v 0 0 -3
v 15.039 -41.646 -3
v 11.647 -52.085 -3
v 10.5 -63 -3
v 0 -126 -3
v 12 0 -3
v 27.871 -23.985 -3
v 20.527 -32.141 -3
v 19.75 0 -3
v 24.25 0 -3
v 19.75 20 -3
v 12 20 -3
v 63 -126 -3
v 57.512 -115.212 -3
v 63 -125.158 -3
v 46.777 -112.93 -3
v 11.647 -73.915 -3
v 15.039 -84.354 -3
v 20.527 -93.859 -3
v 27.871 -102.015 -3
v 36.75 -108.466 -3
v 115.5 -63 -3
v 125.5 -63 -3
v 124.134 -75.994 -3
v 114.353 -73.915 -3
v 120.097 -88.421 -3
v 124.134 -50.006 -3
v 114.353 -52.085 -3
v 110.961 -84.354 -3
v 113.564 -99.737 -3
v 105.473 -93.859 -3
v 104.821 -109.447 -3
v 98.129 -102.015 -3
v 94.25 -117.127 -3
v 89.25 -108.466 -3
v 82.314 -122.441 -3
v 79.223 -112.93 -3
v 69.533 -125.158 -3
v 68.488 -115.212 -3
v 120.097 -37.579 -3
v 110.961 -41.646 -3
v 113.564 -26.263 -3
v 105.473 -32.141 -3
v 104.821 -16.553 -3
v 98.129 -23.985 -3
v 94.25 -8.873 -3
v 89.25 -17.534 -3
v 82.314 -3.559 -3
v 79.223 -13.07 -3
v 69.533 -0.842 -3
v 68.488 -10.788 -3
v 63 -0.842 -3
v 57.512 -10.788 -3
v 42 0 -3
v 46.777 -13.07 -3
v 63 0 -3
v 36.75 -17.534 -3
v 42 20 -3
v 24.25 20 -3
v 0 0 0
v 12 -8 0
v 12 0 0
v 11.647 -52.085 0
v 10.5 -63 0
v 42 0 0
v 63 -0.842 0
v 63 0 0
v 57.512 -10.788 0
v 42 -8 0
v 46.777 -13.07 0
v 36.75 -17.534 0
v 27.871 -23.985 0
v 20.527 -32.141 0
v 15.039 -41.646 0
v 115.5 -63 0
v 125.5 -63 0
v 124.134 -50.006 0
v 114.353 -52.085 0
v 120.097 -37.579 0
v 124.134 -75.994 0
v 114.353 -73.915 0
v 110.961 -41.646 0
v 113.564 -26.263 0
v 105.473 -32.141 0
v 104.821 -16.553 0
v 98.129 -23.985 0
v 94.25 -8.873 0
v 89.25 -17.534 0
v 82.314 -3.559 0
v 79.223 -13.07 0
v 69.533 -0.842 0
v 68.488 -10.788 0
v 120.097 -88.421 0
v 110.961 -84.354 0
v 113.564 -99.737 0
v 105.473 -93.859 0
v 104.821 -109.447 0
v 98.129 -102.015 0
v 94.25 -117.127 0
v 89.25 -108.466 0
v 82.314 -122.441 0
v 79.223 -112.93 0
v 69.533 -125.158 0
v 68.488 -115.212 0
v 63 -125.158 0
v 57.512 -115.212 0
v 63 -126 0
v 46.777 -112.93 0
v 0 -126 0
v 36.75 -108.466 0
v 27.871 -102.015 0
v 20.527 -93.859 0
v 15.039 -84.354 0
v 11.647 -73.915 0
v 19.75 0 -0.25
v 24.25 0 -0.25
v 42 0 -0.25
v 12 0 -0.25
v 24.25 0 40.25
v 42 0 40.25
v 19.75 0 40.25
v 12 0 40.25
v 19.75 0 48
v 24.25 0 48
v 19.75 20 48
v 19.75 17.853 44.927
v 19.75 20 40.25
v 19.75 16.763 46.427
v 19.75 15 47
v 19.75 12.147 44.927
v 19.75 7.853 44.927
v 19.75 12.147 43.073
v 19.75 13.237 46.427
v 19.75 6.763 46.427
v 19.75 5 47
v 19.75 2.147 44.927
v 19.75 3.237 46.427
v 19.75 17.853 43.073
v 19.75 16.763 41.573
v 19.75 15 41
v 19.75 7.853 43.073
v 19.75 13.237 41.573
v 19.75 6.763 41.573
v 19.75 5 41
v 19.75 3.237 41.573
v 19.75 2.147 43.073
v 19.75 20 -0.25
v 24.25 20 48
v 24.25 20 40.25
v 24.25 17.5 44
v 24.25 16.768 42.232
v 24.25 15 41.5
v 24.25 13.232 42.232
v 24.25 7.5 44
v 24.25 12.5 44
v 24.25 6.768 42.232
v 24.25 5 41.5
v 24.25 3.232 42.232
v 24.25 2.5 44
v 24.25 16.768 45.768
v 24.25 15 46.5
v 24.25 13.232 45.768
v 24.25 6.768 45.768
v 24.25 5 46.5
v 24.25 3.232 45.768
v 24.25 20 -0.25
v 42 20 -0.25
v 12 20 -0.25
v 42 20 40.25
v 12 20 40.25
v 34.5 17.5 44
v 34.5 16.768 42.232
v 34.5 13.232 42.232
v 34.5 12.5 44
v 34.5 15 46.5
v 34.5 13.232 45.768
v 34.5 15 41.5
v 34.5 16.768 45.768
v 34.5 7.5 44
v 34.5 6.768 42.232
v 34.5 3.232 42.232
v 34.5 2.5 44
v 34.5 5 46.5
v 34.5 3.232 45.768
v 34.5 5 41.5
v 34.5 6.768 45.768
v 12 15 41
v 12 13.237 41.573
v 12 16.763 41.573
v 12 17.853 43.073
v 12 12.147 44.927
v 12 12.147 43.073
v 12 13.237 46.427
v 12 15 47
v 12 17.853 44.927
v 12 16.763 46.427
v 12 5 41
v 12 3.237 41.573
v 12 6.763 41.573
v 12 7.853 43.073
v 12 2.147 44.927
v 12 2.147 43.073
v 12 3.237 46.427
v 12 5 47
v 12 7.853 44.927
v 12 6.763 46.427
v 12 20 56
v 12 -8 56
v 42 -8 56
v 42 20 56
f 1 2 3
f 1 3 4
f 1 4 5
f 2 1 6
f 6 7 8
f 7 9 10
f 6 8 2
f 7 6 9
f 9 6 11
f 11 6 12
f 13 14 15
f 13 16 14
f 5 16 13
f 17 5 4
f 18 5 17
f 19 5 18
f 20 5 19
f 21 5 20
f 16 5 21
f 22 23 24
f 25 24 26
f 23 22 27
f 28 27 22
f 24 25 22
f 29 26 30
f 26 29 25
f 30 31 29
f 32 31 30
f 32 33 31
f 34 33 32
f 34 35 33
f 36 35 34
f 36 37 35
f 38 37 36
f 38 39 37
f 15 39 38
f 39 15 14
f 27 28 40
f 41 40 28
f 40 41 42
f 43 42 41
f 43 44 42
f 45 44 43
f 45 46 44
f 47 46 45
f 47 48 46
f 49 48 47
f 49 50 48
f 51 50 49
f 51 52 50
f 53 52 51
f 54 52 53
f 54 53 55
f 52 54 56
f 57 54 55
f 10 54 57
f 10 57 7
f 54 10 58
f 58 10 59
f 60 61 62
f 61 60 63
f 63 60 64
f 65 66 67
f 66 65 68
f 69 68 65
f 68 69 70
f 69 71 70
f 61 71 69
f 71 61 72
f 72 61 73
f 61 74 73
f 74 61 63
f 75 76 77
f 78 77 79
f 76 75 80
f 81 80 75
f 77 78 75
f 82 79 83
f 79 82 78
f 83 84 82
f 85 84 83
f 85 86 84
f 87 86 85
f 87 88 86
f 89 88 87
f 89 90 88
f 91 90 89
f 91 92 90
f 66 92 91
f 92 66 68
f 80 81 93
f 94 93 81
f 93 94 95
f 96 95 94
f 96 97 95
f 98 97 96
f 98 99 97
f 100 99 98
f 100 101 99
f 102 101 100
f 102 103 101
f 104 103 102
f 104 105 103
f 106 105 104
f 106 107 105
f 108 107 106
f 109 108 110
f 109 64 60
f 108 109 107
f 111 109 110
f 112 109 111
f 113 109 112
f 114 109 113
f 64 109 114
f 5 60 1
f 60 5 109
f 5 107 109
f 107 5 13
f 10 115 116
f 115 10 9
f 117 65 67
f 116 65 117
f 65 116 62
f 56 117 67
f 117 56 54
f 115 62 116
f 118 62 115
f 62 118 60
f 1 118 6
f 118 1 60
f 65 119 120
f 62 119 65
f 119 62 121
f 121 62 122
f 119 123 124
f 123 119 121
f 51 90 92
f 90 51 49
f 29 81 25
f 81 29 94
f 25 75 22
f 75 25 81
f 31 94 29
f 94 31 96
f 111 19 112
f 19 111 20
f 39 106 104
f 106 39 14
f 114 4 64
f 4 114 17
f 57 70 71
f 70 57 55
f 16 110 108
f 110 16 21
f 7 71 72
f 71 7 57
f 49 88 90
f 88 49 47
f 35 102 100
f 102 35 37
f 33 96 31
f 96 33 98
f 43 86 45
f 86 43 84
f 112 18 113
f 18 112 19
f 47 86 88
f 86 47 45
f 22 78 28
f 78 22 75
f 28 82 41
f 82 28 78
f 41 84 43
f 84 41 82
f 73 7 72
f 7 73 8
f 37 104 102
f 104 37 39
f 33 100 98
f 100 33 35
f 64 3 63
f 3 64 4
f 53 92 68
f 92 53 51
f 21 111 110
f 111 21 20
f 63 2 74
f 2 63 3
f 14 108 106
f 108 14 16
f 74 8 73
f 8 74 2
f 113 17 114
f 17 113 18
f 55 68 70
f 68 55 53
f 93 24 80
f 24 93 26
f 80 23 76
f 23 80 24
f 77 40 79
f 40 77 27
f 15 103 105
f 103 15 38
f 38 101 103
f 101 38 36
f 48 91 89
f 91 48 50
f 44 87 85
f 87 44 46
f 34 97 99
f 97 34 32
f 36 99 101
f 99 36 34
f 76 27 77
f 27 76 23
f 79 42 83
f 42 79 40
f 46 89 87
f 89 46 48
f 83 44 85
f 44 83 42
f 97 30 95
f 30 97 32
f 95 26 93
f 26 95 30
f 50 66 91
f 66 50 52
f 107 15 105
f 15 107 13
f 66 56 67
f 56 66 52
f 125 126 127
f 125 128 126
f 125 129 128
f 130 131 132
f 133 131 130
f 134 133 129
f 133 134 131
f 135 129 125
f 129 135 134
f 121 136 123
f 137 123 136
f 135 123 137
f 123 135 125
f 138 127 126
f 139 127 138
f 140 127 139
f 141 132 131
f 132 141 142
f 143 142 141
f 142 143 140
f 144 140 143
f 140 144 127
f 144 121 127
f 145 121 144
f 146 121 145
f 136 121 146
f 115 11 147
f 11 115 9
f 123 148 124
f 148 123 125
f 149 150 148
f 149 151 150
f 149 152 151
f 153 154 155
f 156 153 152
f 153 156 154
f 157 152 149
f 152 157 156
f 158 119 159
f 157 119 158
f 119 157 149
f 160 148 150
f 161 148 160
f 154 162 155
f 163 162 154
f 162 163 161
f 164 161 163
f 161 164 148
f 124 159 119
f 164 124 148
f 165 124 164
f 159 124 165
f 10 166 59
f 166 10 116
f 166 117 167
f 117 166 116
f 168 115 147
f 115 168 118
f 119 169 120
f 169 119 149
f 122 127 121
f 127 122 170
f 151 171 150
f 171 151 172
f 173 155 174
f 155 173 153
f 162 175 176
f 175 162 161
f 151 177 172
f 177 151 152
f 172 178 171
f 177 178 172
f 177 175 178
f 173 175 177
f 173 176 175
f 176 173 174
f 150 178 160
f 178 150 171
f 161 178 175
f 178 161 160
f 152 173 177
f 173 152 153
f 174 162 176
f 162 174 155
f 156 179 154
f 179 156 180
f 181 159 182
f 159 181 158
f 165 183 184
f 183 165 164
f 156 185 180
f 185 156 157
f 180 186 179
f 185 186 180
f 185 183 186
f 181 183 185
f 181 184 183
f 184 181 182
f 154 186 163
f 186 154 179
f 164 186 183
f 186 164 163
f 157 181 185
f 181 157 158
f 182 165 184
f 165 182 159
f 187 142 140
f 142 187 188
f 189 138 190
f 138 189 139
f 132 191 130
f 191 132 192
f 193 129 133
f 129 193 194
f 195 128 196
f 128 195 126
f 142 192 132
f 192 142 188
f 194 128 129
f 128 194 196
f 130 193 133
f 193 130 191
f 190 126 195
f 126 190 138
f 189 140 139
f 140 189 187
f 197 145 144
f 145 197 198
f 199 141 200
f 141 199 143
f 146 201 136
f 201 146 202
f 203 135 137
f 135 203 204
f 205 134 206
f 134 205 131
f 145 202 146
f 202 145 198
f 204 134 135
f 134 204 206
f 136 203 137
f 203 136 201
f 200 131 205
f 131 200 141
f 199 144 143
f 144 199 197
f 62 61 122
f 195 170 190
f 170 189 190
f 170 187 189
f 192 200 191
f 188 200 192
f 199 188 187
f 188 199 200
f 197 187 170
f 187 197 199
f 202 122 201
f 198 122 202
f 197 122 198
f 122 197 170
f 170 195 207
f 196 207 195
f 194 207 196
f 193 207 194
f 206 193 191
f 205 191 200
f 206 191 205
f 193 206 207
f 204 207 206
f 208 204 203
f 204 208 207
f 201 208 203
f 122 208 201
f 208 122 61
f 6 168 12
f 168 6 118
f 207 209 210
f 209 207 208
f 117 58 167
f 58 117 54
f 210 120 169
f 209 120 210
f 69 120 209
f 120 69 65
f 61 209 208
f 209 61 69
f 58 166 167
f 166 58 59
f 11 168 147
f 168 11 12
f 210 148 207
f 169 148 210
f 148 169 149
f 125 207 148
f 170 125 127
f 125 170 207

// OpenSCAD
rail_length=220;
rail_thick=3;
rail_depth=15;

carriage_thick=3;
carriage_bowl=105;
carriage_length=carriage_bowl+rail_depth*0.7*2;
carriage_side=(carriage_length-carriage_bowl)/2;
screw_thick=3;
screw_cap=4;

// General Variables
pi = 3.14159;
rad = 57.29578;
clearance = 0.05;   // clearance between teeth

/*  Converts Radians to Degrees */
function grad(pressure_angle) = pressure_angle*rad;

/*  Converts Degrees to Radians */
function radian(pressure_angle) = pressure_angle/rad;


/*  Copy and rotate a Body */
module copier(vect, number, distance, winkel){
    for(i = [0:number-1]){
        translate(v=vect*distance*i)
            rotate(a=i*winkel, v = [0,0,1])
                children(0);
    }
}
/*  Circle Involutes-Function:
    Returns the Polar Coordinates of an Involute Circle
    r = Radius of the Base Circle
    rho = Rolling-angle in Degrees */
function ev(r,rho) = [
    r/cos(rho),
    grad(tan(rho)-radian(rho))
];
/*  Converts 2D Polar Coordinates to Cartesian
    Format: radius, phi; phi = Angle to x-Axis on xy-Plane */
function polar_to_cartesian(polvect) = [
    polvect[0]*cos(polvect[1]),  
    polvect[0]*sin(polvect[1])
];
/*  Spur gear
    modul = Height of the Tooth Tip beyond the Pitch Circle
    tooth_number = Number of Gear Teeth
    width = tooth_width
    bore = Diameter of the Center Hole
    pressure_angle = Pressure Angle, Standard = 20° according to DIN 867. Should not exceed 45°.
    helix_angle = Helix Angle to the Axis of Rotation; 0° = Spur Teeth
    optimized = Create holes for Material-/Weight-Saving or Surface Enhancements where Geometry allows */
module spur_gear(modul, tooth_number, width, bore, pressure_angle = 20, helix_angle = 0, optimized = true) {

    // Dimension Calculations  
    d = modul * tooth_number;                                           // Pitch Circle Diameter
    r = d / 2;                                                      // Pitch Circle Radius
    alpha_spur = atan(tan(pressure_angle)/cos(helix_angle));// Helix Angle in Transverse Section
    db = d * cos(alpha_spur);                                      // Base Circle Diameter
    rb = db / 2;                                                    // Base Circle Radius
    da = (modul <1)? d + modul * 2.2 : d + modul * 2;               // Tip Diameter according to DIN 58400 or DIN 867
    ra = da / 2;                                                    // Tip Circle Radius
    c =  (tooth_number <3)? 0 : modul/6;                                // Tip Clearance
    df = d - 2 * (modul + c);                                       // Root Circle Diameter
    rf = df / 2;                                                    // Root Radius
    rho_ra = acos(rb/ra);                                           // Maximum Rolling Angle;
                                                                    // Involute begins on the Base Circle and ends at the Tip Circle
    rho_r = acos(rb/r);                                             // Rolling Angle at Pitch Circle;
                                                                    // Involute begins on the Base Circle and ends at the Tip Circle
    phi_r = grad(tan(rho_r)-radian(rho_r));                         // Angle to Point of Involute on Pitch Circle
    gamma = rad*width/(r*tan(90-helix_angle));               // Torsion Angle for Extrusion
    step = rho_ra/16;                                            // Involute is divided into 16 pieces
    tau = 360/tooth_number;                                             // Pitch Angle
    
    r_hole = (2*rf - bore)/8;                                    // Radius of Holes for Material-/Weight-Saving
    rm = bore/2+2*r_hole;                                        // Distance of the Axes of the Holes from the Main Axis
    z_hole = floor(2*pi*rm/(3*r_hole));                             // Number of Holes for Material-/Weight-Saving
    
    optimized = (optimized && r >= width*1.5 && d > 2*bore);    // is Optimization useful?

    // Drawing
    union(){
        rotate([0,0,-phi_r-90*(1-clearance)/tooth_number]){                     // Center Tooth on X-Axis;
                                                                        // Makes Alignment with other Gears easier

            linear_extrude(height = width, twist = gamma){
                difference(){
                    union(){
                        tooth_width = (180*(1-clearance))/tooth_number+2*phi_r;
                        circle(rf);                                     // Root Circle 
                        for (rot = [0:tau:360]){
                            rotate (rot){                               // Copy and Rotate "Number of Teeth"
                                polygon(concat(                         // Tooth
                                    [[0,0]],                            // Tooth Segment starts and ends at Origin
                                    [for (rho = [0:step:rho_ra])     // From zero Degrees (Base Circle)
                                                                        // To Maximum Involute Angle (Tip Circle)
                                        polar_to_cartesian(ev(rb,rho))],       // First Involute Flank

                                    [polar_to_cartesian(ev(rb,rho_ra))],       // Point of Involute on Tip Circle

                                    [for (rho = [rho_ra:-step:0])    // of Maximum Involute Angle (Tip Circle)
                                                                        // to zero Degrees (Base Circle)
                                        polar_to_cartesian([ev(rb,rho)[0], tooth_width-ev(rb,rho)[1]])]
                                                                        // Second Involute Flank
                                                                        // (180*(1-clearance)) instead of 180 Degrees,
                                                                        // to allow clearance of the Flanks
                                    )
                                );
                            }
                        }
                    }           
                    circle(r = rm+r_hole*1.49);                         // "bore"
                }
            }
        }
        // with Material Savings
        if (optimized) {
            linear_extrude(height = width){
                difference(){
                        circle(r = (bore+r_hole)/2);
                        circle(r = bore/2);                          // bore
                    }
                }
            linear_extrude(height = (width-r_hole/2 < width*2/3) ? width*2/3 : width-r_hole/2){
                difference(){
                    circle(r=rm+r_hole*1.51);
                    union(){
                        circle(r=(bore+r_hole)/2);
                        for (i = [0:1:z_hole]){
                            translate(sphere_to_cartesian([rm,90,i*360/z_hole]))
                                circle(r = r_hole);
                        }
                    }
                }
            }
        }
        // without Material Savings
        else {
            linear_extrude(height = width){
                difference(){
                    circle(r = rm+r_hole*1.51);
                    circle(r = bore/2);
                }
            }
        }
    }
}
/*  Herringbone; uses the module "spur_gear"
    modul = Height of the Tooth Tip beyond the Pitch Circle
    tooth_number = Number of Gear Teeth
    width = tooth_width
    bore = Diameter of the Center Hole
    pressure_angle = Pressure Angle, Standard = 20° according to DIN 867. Should not exceed 45°.
    helix_angle = Helix Angle to the Axis of Rotation, Standard = 0° (Spur Teeth)
    optimized = Holes for Material-/Weight-Saving */
module herringbone_gear(modul, tooth_number, width, bore, pressure_angle = 20, helix_angle=0, optimized=true){

    width = width/2;
    d = modul * tooth_number;                                           // Pitch Circle Diameter
    r = d / 2;                                                      // Pitch Circle Radius
    c =  (tooth_number <3)? 0 : modul/6;                                // Tip Clearance

    df = d - 2 * (modul + c);                                       // Root Circle Diameter
    rf = df / 2;                                                    // Root Radius

    r_hole = (2*rf - bore)/8;                                    // Radius of Holes for Material-/Weight-Saving
    rm = bore/2+2*r_hole;                                        // Distance of the Axes of the Holes from the Main Axis
    z_hole = floor(2*pi*rm/(3*r_hole));                             // Number of Holes for Material-/Weight-Saving
    
    optimized = (optimized && r >= width*3 && d > 2*bore);      // is Optimization useful?

    translate([0,0,width]){
        union(){
            spur_gear(modul, tooth_number, width, 2*(rm+r_hole*1.49), pressure_angle, helix_angle, false);      // bottom Half
            mirror([0,0,1]){
                spur_gear(modul, tooth_number, width, 2*(rm+r_hole*1.49), pressure_angle, helix_angle, false);  // top Half
            }
        }
    }
    // with Material Savings
    if (optimized) {
        linear_extrude(height = width*2){
            difference(){
                    circle(r = (bore+r_hole)/2);
                    circle(r = bore/2);                          // bore
                }
            }
        linear_extrude(height = (2*width-r_hole/2 < 1.33*width) ? 1.33*width : 2*width-r_hole/2){ //width*4/3
            difference(){
                circle(r=rm+r_hole*1.51);
                union(){
                    circle(r=(bore+r_hole)/2);
                    for (i = [0:1:z_hole]){
                        translate(sphere_to_cartesian([rm,90,i*360/z_hole]))
                            circle(r = r_hole);
                    }
                }
            }
        }
    }
    // without Material Savings
    else {
        linear_extrude(height = width*2){
            difference(){
                circle(r = rm+r_hole*1.51);
                circle(r = bore/2);
            }
        }
    }
}

/*  rack
    modul = Height of the Tooth Tip above the Rolling LIne
    length = Length of the Rack
    height = Height of the Rack to the Pitch Line
    width = Width of a Tooth
    pressure_angle = Pressure Angle, Standard = 20° according to DIN 867. Should not exceed 45°.
    helix_angle = Helix Angle of the Rack Transverse Axis; 0° = Spur Teeth */
module rack(modul, length, height, width, pressure_angle = 20, helix_angle = 0) {

    // Dimension Calculations
    modul=modul*(1-clearance);
    c = modul / 6;                                              // Tip Clearance
    mx = modul/cos(helix_angle);                          // Module Shift by Helix Angle in the X-Direction
    a = 2*mx*tan(pressure_angle)+c*tan(pressure_angle);       // Flank Width
    b = pi*mx/2-2*mx*tan(pressure_angle);                      // Tip Width
    x = width*tan(helix_angle);                          // Topside Shift by Helix Angle in the X-Direction
    nz = ceil((length+abs(2*x))/(pi*mx));                       // Number of Teeth
    
    translate([-pi*mx*(nz-1)/2-a-b/2,-modul,0]){
        intersection(){                                         // Creates a Prism that fits into a Geometric Box
            copier([1,0,0], nz, pi*mx, 0){
                polyhedron(
                    points=[[0,-c,0], [a,2*modul,0], [a+b,2*modul,0], [2*a+b,-c,0], [pi*mx,-c,0], [pi*mx,modul-height,0], [0,modul-height,0], // Underside
                        [0+x,-c,width], [a+x,2*modul,width], [a+b+x,2*modul,width], [2*a+b+x,-c,width], [pi*mx+x,-c,width], [pi*mx+x,modul-height,width], [0+x,modul-height,width]],   // Topside
                    faces=[[6,5,4,3,2,1,0],                     // Underside
                        [1,8,7,0],
                        [9,8,1,2],
                        [10,9,2,3],
                        [11,10,3,4],
                        [12,11,4,5],
                        [13,12,5,6],
                        [7,13,6,0],
                        [7,8,9,10,11,12,13],                    // Topside
                    ]
                );
            };
            translate([abs(x),-height+modul-0.5,-0.5]){
                cube([length,height+modul+1,width+1]);          // Cuboid which includes the Volume of the Rack
            }   
        };
    };  
}


module carriage() {
    intersection() {
        difference() {
            cube([carriage_length,carriage_length,carriage_thick]);
            translate([carriage_bowl/2+carriage_side,carriage_bowl/2+carriage_side,-0.5]) cylinder(carriage_thick+1,carriage_bowl/2,carriage_bowl/2);
        }
        
        translate([carriage_bowl/2+carriage_side,carriage_bowl/2+carriage_side,-0.5])  union() {
            cylinder(carriage_thick+1,carriage_bowl/2+10,carriage_bowl/2+10);
            translate([-carriage_length/2,-carriage_length/2,-0.5]) cube([carriage_length/2,carriage_length,carriage_thick+2]);
        }
    }
    translate([gear_thick,-20,-servo_h-servo_screw_lip_height-servo_mount_thick]) mirror([1,0,0]) servo_mount();
}

module rail(l,teeth=true) {
        difference() {
            difference() {
                //body
                union() {
                    cube([rail_depth+rail_thick,l,rail_thick*2+carriage_thick]);
                    
        rack_height=5;
        teeth_height=2;
        rack_width=rail_depth+rail_thick;
        if (teeth)
        translate([rack_width,l/2,-rail_thick]) rotate([-90,0,90]) rack(modul=teeth_height, length=l, height=rack_height-teeth_height, width=rack_width,   pressure_angle=20, helix_angle=0) ;
                }
                //cutout
                carriage_tolerance=1;
                    translate([-1,-0.5,rail_thick-carriage_tolerance/2]) cube([rail_depth+1,l+1,carriage_thick+carriage_tolerance]);
            }
            
            union() {
                lip=2;
                    //screw
                translate([rail_depth/2,screw_thick+5,-0.5]) cylinder(rail_thick*2+carriage_thick+1,screw_thick,screw_thick);
                translate([rail_depth/2,l-screw_thick-5,-0.5]) cylinder(rail_thick*2+carriage_thick+1,screw_thick,screw_thick);
                    //cap
                translate([rail_depth/2,screw_thick+5,lip-10]) cylinder(rail_thick*2+carriage_thick-lip*2+10,screw_cap,screw_cap);
                translate([rail_depth/2,l-screw_thick-5,lip-10]) cylinder(rail_thick*2+carriage_thick-lip*2+10,screw_cap,screw_cap);
            }
        }
        
}

servo_h=40;
servo_w=20;
servo_d=41;
servo_screw_lip_height=8;
servo_screw_lip_offset=8;
servo_screw_lip_thick=4;
servo_screw_inner_offset=4;
gear_thick=12;


module servo() {
    difference() {
        union() {
            cube([servo_d,servo_w,servo_h]);
            //9mm offset - spin nipple
            translate([servo_d,servo_w/2,9.5]) rotate([0,90,0]) cylinder(servo_screw_lip_height,6/2,6/2);
            //lip is 8mm and 4mm thick
            translate([servo_d-servo_screw_lip_thick-servo_screw_lip_height,0,-servo_screw_lip_height]) cube([servo_screw_lip_thick,servo_w,servo_h+servo_screw_lip_height*2]);
        }
            
        union() {
            //screws offset 5mm , 5mm thick
            translate([servo_d-servo_screw_lip_thick-servo_screw_lip_offset-0.5,5,-servo_screw_inner_offset]) rotate([0,90,0]) cylinder(servo_screw_lip_thick+1,5/2,5/2);
            translate([servo_d-servo_screw_lip_thick-servo_screw_lip_offset-0.5,15,-servo_screw_inner_offset]) rotate([0,90,0]) cylinder(servo_screw_lip_thick+1,5/2,5/2);
            translate([servo_d-servo_screw_lip_thick-servo_screw_lip_offset-0.5,5,servo_screw_inner_offset+servo_h]) rotate([0,90,0]) cylinder(servo_screw_lip_thick+1,5/2,5/2);
            translate([servo_d-servo_screw_lip_thick-servo_screw_lip_offset-0.5,15,servo_screw_inner_offset+servo_h]) rotate([0,90,0]) cylinder(servo_screw_lip_thick+1,5/2,5/2);
        }
    }
    
}

servo_mount_thick=8;
servo_screw_depth=10;
servo_mount_depth=30;
module servo_mount() {
    translate([-servo_d,0,servo_screw_lip_height+servo_mount_thick]) {
        difference() {
            mount_tol=0.5;
            translate([servo_d-servo_mount_depth,0,-servo_mount_thick-servo_screw_lip_height]) cube([servo_mount_depth,servo_w+servo_mount_thick,servo_h+carriage_thick+servo_screw_lip_height+servo_mount_thick]);

            union() {
                //lip is 8mm and 4mm thick
                    translate([servo_d-servo_screw_lip_thick-mount_tol/2-servo_screw_lip_offset,-1,-servo_screw_lip_height]) cube([servo_screw_lip_thick+mount_tol,servo_w+1,servo_h+servo_screw_lip_height*2]);
                translate([-0.5,-1,-mount_tol/2]) cube([servo_d+1,servo_w+1,servo_h+mount_tol]);
                
                    translate([servo_d-servo_screw_lip_thick-servo_screw_lip_offset-servo_screw_depth-0.5,5,-servo_screw_lip_thick]) rotate([0,90,0]) cylinder(servo_screw_lip_thick+servo_screw_lip_offset+servo_screw_depth+1,5/2,5/2);
                    translate([servo_d-servo_screw_lip_thick-servo_screw_lip_offset-servo_screw_depth-0.5,15,-servo_screw_lip_thick]) rotate([0,90,0]) cylinder(servo_screw_lip_thick+servo_screw_lip_offset+servo_screw_depth+1,5/2,5/2);
                
                    translate([servo_d-servo_screw_lip_thick-servo_screw_lip_offset,5,-servo_screw_lip_thick]) rotate([0,90,0]) cylinder(servo_screw_lip_thick+servo_screw_lip_offset+1,6/2,6/2);
                    translate([servo_d-servo_screw_lip_thick-servo_screw_lip_offset,15,-servo_screw_lip_thick]) rotate([0,90,0]) cylinder(servo_screw_lip_thick+servo_screw_lip_offset+1,6/2,6/2);
            }
        }
    }
}

servo_head_tolerance=0.3;
servo_head_thick=2.5;
servo_head_middle=13+servo_head_tolerance;
servo_head_tail=8+servo_head_tolerance;
servo_head_length=55;
module gear() {
    translate([0,0,gear_thick]) mirror([0,0,1]) difference() {
        herringbone_gear (modul=2, tooth_number=23, width=gear_thick, bore=10, pressure_angle=20, helix_angle=0, optimized=false);
        translate([0,-servo_head_middle/2,servo_head_thick/2]) linear_extrude(height = servo_head_thick, center = true, convexity = 10, twist = 0) polygon(points=[ [0,0], [-servo_head_length/2,(servo_head_middle-servo_head_tail)/2], [-servo_head_length/2,(servo_head_middle+servo_head_tail)/2], [0,servo_head_middle], [servo_head_length/2,(servo_head_middle+servo_head_tail)/2], [servo_head_length/2,(servo_head_middle-servo_head_tail)/2]]);
    }
}
 

//model
//    color([1,0,0]) translate([servo_d+gear_thick,4,-servo_h]) rotate([0,0,180]) servo();
//color([1,1,1]) translate([carriage_length-rail_depth*0.7,0,-rail_thick]) rail(rail_length,false);
//color([1,1,1])translate([rail_depth*0.7,rail_length,-rail_thick]) rotate([0,0,180]) rail(rail_length);
//color([0,0,1]) carriage();
//color([0,1,0]) translate([servo_d+gear_thick,4,-servo_h]) rotate([0,0,180]) translate([servo_d,servo_w/2,9.5]) rotate([90,0,90]) gear();

//build
rotate([180,0,0]) color([0,0,1]) carriage();
//color([1,1,1]) rotate([0,90,0])  rail(rail_length,false);
//color([1,1,1])  rotate([0,90,0]) rail(rail_length);
//color([0,1,0])  rotate([0,0,0]) gear();
       
